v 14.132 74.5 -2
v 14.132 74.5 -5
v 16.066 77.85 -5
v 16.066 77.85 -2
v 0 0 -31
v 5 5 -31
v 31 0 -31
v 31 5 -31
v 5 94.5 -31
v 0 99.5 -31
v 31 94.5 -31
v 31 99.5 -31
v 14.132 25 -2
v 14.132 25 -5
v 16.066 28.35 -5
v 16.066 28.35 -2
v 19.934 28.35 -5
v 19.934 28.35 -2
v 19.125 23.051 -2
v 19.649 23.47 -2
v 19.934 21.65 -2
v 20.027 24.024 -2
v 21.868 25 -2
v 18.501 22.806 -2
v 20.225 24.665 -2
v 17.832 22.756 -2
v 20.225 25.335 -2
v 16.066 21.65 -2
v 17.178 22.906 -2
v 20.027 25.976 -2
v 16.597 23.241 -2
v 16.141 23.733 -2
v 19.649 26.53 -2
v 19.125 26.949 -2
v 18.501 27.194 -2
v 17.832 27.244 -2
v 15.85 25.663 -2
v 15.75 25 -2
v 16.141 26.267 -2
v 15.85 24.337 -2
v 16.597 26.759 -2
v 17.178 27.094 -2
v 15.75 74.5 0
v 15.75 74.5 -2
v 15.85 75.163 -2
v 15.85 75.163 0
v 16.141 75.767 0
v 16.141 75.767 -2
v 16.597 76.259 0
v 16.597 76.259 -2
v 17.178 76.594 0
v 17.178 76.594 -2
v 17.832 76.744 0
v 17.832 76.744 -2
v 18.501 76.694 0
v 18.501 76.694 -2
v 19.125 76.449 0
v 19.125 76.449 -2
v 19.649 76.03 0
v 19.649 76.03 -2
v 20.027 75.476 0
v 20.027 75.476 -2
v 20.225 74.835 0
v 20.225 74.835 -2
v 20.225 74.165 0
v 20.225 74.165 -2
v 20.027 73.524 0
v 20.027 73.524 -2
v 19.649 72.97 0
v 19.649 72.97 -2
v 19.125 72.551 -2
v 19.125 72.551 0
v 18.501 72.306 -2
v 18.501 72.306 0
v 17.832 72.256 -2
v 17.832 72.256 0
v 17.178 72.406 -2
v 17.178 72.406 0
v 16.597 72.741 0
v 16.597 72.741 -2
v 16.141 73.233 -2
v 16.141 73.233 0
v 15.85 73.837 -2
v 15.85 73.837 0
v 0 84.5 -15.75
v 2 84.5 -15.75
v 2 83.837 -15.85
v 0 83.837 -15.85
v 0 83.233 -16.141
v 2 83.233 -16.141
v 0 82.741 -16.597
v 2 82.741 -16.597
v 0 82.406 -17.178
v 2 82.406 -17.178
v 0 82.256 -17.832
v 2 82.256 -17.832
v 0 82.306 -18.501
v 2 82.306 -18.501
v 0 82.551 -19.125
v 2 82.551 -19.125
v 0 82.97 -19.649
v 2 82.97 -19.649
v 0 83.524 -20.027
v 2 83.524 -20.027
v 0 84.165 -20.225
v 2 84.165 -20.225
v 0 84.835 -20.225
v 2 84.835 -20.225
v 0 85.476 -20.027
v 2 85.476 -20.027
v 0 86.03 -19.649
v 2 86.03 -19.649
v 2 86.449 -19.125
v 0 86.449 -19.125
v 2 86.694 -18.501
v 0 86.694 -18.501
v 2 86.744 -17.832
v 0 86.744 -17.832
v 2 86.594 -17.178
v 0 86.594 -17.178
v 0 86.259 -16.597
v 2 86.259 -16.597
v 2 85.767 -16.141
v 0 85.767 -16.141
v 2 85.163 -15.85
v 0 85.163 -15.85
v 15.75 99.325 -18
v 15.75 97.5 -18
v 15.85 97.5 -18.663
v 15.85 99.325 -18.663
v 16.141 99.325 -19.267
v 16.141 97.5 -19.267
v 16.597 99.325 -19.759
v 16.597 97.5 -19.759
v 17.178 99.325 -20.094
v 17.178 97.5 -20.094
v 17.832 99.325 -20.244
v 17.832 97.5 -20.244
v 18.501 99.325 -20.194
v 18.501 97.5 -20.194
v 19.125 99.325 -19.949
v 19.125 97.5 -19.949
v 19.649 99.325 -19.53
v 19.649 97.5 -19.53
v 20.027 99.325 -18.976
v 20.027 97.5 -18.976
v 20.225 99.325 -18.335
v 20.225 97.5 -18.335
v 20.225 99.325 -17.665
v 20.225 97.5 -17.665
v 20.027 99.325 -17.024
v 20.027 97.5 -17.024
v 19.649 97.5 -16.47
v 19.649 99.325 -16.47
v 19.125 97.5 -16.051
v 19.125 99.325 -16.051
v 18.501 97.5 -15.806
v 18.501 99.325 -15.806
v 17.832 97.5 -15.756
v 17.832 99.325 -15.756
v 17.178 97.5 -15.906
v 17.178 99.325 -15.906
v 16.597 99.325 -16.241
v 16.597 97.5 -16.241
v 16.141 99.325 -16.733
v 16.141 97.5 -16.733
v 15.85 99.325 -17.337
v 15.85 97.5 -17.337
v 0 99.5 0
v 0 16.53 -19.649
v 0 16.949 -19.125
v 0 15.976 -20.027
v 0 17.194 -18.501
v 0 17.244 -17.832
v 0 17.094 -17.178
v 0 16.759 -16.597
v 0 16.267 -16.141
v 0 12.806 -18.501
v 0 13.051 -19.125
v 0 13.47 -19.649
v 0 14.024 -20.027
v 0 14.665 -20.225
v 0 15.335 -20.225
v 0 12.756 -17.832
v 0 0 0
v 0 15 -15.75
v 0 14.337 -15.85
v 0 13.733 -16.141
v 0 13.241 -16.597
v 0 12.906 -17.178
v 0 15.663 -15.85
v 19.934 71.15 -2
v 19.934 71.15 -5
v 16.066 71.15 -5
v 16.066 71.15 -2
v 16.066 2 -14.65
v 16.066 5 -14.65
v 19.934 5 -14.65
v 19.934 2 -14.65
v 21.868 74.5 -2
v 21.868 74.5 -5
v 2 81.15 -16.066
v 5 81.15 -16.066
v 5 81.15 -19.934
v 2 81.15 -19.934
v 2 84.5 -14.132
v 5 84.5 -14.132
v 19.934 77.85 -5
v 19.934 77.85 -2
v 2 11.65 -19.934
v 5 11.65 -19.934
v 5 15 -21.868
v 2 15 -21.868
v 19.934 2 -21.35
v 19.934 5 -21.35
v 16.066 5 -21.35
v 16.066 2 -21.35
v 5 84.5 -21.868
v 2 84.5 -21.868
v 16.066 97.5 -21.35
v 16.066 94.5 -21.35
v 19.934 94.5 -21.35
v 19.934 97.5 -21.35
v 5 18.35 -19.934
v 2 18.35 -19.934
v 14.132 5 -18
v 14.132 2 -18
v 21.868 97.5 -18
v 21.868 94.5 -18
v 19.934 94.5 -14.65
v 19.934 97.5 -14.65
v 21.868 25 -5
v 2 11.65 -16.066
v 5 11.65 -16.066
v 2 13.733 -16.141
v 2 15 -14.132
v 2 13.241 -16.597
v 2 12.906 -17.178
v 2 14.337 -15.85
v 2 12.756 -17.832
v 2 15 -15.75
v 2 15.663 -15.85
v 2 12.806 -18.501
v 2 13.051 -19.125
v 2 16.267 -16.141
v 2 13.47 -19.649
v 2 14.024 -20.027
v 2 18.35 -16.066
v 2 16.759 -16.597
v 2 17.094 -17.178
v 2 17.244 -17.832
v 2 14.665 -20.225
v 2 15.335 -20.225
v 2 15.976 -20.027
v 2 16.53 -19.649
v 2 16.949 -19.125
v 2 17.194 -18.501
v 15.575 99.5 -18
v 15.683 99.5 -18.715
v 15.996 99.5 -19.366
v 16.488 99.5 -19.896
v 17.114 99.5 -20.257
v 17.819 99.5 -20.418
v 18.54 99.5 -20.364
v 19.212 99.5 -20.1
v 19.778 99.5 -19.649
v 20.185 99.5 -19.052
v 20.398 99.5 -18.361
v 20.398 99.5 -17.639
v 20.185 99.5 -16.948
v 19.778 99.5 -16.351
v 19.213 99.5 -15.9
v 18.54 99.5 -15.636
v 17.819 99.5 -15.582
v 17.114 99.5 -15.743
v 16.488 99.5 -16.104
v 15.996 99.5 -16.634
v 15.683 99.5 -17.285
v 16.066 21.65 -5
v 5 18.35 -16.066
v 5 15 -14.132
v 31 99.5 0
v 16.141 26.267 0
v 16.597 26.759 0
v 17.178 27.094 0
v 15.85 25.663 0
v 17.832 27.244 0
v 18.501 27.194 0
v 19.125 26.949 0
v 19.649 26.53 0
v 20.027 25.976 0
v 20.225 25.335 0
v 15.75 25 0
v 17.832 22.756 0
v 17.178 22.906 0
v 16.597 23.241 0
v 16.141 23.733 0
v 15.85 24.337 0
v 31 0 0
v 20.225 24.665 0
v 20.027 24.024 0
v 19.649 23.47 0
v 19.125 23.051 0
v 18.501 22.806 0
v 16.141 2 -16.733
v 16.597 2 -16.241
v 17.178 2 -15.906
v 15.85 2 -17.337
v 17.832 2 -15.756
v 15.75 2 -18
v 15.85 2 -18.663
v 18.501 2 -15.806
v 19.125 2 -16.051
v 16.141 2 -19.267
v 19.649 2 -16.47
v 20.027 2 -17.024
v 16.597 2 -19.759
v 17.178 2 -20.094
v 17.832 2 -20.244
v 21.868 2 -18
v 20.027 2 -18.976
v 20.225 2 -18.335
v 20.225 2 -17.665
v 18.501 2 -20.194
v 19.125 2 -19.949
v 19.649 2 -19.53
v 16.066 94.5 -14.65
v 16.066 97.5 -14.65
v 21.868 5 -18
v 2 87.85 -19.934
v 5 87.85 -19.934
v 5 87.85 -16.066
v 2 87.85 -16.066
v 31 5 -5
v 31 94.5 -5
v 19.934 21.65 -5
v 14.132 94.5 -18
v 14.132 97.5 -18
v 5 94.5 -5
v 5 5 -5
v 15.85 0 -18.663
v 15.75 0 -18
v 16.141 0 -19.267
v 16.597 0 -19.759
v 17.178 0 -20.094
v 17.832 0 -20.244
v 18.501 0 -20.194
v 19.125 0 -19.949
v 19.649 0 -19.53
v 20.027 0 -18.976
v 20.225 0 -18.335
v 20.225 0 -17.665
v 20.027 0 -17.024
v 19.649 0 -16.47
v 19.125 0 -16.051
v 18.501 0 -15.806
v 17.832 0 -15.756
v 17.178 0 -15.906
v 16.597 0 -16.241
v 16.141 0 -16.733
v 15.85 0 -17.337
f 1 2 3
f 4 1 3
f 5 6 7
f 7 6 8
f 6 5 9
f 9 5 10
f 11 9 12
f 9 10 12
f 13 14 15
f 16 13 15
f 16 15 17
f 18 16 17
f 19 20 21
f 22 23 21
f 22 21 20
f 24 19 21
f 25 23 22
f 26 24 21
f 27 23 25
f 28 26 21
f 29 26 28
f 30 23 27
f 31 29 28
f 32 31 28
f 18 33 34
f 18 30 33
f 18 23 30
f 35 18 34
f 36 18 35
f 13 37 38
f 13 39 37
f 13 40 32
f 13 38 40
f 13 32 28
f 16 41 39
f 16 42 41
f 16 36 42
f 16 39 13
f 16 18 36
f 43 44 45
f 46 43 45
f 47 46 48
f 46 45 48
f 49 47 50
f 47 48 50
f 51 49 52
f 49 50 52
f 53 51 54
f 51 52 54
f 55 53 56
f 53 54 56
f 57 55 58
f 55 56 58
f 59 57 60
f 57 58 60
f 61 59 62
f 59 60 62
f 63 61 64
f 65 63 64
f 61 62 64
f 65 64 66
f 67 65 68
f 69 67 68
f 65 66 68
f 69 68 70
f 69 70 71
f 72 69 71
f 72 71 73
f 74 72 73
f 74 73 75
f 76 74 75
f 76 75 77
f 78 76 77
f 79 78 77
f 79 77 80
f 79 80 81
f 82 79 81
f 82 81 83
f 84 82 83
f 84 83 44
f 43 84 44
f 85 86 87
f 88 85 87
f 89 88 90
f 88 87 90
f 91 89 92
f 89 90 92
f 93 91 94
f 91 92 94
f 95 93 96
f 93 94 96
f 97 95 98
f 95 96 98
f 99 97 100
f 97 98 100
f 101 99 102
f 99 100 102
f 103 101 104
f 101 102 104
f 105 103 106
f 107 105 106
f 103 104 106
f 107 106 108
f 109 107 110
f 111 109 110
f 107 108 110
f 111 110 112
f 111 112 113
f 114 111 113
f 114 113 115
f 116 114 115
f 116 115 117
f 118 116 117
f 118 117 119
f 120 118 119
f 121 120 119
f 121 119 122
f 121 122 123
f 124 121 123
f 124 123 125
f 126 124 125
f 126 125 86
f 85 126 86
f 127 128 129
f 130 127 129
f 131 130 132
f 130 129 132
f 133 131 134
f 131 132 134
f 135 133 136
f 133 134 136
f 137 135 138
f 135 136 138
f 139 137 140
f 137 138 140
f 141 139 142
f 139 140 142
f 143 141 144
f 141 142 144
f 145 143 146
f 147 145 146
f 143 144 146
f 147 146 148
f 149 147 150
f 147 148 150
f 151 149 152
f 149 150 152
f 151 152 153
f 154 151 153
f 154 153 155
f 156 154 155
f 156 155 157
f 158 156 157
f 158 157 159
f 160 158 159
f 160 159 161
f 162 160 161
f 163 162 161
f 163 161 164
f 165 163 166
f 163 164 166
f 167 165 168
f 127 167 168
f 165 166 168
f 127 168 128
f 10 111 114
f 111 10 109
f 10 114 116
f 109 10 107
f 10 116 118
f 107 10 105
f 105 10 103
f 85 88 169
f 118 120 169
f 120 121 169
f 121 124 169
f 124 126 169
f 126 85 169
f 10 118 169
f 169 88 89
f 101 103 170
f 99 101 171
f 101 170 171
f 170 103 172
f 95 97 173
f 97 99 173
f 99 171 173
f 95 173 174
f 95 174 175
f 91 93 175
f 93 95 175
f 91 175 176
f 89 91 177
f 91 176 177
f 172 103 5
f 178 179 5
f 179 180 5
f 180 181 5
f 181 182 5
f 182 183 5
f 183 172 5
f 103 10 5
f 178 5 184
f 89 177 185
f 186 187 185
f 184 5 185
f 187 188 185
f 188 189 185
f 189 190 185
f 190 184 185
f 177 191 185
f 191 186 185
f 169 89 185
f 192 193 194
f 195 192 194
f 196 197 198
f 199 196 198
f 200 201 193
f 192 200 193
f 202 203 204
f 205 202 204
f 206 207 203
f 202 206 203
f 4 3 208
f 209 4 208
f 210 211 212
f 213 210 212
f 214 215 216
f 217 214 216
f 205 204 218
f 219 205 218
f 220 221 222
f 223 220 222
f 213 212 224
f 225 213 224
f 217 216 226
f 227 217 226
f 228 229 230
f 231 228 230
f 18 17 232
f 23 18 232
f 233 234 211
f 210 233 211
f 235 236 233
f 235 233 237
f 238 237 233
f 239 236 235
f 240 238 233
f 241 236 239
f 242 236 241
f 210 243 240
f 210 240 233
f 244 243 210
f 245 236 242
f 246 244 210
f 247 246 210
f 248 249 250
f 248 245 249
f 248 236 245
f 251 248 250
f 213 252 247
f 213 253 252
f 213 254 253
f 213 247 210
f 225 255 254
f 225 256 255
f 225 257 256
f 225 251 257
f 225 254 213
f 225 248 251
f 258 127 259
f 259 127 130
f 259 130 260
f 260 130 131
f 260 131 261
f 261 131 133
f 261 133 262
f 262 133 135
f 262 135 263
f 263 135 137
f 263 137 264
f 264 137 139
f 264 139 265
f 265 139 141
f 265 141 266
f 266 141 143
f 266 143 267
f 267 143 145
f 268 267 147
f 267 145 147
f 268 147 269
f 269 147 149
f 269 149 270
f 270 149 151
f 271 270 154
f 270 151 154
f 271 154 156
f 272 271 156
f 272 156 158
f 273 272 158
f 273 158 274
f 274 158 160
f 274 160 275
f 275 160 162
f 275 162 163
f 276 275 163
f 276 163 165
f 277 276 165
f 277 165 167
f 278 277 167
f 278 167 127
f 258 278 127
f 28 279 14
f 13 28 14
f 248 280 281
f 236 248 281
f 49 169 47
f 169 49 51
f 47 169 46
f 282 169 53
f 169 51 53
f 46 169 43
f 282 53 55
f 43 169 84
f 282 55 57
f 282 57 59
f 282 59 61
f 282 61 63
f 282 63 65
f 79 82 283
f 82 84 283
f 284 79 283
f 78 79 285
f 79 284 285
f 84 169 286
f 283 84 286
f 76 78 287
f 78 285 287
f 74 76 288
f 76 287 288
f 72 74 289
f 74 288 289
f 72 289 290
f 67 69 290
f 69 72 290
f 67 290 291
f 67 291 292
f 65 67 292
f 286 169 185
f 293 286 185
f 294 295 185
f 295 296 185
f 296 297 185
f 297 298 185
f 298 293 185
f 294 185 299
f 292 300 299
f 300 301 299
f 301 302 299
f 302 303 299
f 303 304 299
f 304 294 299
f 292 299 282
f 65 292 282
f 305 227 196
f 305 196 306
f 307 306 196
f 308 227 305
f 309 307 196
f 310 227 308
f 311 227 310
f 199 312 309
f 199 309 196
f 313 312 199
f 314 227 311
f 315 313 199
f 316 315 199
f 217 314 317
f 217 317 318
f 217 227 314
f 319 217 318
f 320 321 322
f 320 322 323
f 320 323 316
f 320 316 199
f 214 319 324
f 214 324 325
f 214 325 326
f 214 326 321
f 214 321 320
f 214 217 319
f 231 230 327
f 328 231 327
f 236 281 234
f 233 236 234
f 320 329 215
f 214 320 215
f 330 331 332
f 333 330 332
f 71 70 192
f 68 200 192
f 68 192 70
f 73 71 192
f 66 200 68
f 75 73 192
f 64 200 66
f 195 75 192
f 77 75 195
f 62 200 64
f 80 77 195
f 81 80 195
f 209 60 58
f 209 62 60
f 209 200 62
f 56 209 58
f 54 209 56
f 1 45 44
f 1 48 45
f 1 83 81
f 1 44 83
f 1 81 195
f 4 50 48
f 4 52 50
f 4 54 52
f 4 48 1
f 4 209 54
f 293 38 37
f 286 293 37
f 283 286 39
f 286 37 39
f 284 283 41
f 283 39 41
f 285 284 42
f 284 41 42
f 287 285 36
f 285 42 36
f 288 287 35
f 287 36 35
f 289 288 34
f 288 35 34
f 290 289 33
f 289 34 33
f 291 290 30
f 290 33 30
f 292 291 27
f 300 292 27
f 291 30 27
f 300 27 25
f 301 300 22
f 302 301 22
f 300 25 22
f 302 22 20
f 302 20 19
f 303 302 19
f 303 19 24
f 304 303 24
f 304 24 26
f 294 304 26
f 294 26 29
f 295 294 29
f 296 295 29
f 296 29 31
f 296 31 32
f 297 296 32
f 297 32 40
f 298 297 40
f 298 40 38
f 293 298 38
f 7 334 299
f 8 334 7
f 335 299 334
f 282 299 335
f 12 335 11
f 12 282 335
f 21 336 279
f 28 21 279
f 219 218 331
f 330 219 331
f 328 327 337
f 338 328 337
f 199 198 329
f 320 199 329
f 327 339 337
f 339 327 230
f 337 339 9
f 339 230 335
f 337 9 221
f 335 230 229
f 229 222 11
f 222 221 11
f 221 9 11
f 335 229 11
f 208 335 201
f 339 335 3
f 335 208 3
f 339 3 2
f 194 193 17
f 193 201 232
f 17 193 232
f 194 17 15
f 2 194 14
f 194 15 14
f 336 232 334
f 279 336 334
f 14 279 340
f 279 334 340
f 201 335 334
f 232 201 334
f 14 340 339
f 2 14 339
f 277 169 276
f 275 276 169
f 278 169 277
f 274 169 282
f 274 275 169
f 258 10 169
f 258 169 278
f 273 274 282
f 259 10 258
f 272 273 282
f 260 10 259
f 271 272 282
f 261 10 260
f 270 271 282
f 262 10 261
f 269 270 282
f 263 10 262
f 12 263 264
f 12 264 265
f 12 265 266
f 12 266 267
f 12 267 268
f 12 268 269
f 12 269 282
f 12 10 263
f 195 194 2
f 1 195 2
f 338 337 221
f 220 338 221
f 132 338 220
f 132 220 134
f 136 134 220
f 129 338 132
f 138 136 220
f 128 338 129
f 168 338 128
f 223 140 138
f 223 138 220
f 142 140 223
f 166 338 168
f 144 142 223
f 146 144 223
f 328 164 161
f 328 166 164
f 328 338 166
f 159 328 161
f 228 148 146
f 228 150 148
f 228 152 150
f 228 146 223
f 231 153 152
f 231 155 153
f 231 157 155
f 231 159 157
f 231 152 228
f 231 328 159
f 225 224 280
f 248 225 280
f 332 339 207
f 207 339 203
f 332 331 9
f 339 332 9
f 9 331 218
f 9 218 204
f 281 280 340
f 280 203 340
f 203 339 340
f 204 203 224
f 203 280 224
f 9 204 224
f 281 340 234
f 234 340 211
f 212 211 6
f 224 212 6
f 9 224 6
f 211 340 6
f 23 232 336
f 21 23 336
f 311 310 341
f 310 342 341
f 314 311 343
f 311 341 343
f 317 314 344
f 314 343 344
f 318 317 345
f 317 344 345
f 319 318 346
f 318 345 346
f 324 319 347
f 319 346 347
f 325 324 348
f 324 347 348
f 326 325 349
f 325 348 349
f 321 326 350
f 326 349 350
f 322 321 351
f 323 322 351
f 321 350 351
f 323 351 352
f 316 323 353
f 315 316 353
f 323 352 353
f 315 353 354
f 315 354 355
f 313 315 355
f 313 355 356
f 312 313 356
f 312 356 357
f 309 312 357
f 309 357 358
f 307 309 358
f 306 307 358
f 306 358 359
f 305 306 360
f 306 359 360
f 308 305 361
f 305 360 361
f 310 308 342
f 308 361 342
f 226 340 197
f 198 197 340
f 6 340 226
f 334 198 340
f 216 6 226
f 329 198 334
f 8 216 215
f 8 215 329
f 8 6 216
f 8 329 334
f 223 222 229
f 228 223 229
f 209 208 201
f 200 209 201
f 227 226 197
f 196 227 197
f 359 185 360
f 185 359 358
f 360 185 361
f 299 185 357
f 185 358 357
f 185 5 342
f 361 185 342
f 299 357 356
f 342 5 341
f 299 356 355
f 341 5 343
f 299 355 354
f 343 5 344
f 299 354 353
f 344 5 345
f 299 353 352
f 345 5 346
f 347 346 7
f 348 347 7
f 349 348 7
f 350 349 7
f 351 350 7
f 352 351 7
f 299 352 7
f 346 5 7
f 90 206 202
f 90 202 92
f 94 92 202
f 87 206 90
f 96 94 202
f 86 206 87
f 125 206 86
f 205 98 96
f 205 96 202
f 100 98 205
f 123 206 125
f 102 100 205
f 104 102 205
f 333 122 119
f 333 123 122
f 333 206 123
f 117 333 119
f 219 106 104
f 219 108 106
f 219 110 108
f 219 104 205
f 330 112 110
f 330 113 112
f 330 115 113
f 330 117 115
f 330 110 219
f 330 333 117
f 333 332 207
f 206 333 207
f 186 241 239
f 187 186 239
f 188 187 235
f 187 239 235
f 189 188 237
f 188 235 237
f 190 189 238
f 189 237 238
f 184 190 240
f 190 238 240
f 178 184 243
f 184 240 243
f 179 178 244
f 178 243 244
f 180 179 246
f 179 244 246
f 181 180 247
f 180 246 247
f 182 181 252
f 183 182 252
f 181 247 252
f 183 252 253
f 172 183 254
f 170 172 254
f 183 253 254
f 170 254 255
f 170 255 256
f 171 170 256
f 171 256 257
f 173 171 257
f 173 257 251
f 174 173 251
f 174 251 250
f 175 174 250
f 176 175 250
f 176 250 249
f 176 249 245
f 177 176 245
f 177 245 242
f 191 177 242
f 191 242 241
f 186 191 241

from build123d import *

# Parameters (mm, degrees)
RESSALTO_EXTRUS_O1_DEPTH          = 99.5
FURO_COM_FOLGA_DE_M43_D           = 4.5
FURO_COM_FOLGA_DE_M43_ON_FACE_2_D = 4.5
NERVURA4_START                    = -5
NERVURA4_OUTLINE_W                = 26
NERVURA4_OUTLINE_H                = 26
NERVURA4_DEPTH                    = 5
CORTE_EXTRUS_O3_DEPTH             = 3
CORTE_EXTRUS_O4_DEPTH             = 3
FURO_COM_FOLGA_DE_M42_D           = 4.5
FURO_COM_FOLGA_DE_M42_CSINK_D     = 4.85
FURO_COM_FOLGA_DE_M42_CSINK_ANGLE = 90
CORTE_EXTRUS_O5_DEPTH             = 3
CORTE_EXTRUS_O6_DEPTH             = 3


# Read off the part's stored shape, not the designer's step: Nervura4
with BuildPart() as part:
    # Esboço1 → Ressalto-extrusão1 (new body)
    with BuildSketch(Plane(origin=(0, 0, 0), x_dir=(1, 0, 0), z_dir=(0, 1, 0))):
        Polygon((0, 0), (31, 0), (31, 5), (5, 5), (5, 31), (0, 31), align=None)
    extrude(amount=RESSALTO_EXTRUS_O1_DEPTH)

    # Furo com folga de M43 (through all)
    with Locations(Plane(origin=(0, 84.5, -18), x_dir=(0, 0, -1), z_dir=(-1, 0, 0))):
        with Locations((0, 0), (0, 69.5)):
            Hole(FURO_COM_FOLGA_DE_M43_D / 2)

    # Furo com folga de M43 on face 2 (through all)
    with Locations(Plane(origin=(18, 74.5, 0), x_dir=(1, 0, 0), z_dir=(0, 0, 1))):
        with Locations((0, 0), (0, -49.5)):
            Hole(FURO_COM_FOLGA_DE_M43_ON_FACE_2_D / 2)

    # Nervura4 outline → Nervura4 (add)
    with BuildSketch(Plane(origin=(0, 99.5, 0), x_dir=(1, 0, 0), z_dir=(0, 1, 0)).offset(NERVURA4_START)):
        with Locations((18, 18)):
            Rectangle(NERVURA4_OUTLINE_W, NERVURA4_OUTLINE_H)
    nervura4 = extrude(amount=NERVURA4_DEPTH)

    # Esboço17 → Corte-extrusão3 (cut)
    with BuildSketch(Plane(origin=(0, 0, -5), x_dir=(-1, 0, 0), z_dir=(0, 0, -1))):
        Polygon((-16.065876598, 77.85), (-19.934123402, 77.85), (-21.868246804, 74.5), (-19.934123402, 71.15), (-16.065876598, 71.15), (-14.131753196, 74.5), align=None)
        Polygon((-14.131753196, 25), (-16.065876598, 28.35), (-19.934123402, 28.35), (-21.868246804, 25), (-19.934123402, 21.65), (-16.065876598, 21.65), align=None)
    extrude(amount=-CORTE_EXTRUS_O3_DEPTH, mode=Mode.SUBTRACT)

    # Esboço18 → Corte-extrusão4 (cut)
    with BuildSketch(Plane(origin=(5, 0, 0), x_dir=(0, 0, -1), z_dir=(1, 0, 0))):
        Polygon((19.934123402, 87.85), (16.065876598, 87.85), (14.131753196, 84.5), (16.065876598, 81.15), (19.934123402, 81.15), (21.868246804, 84.5), align=None)
        Polygon((21.868246804, 15), (19.934123402, 18.35), (16.065876598, 18.35), (14.131753196, 15), (16.065876598, 11.65), (19.934123402, 11.65), align=None)
    extrude(amount=-CORTE_EXTRUS_O4_DEPTH, mode=Mode.SUBTRACT)

    # Espelhar1: Nervura4 across plane
    add(nervura4.mirror(Plane(origin=(0, 49.75, 0), x_dir=(0, 0, 1), z_dir=(0, -1, 0))))

    # Furo com folga de M42 (through all)
    with Locations(Plane(origin=(0, 99.5, 0), x_dir=(1, 0, 0), z_dir=(0, 1, 0))):
        with Locations((18, 18)):
            CounterSinkHole(FURO_COM_FOLGA_DE_M42_D / 2, FURO_COM_FOLGA_DE_M42_CSINK_D / 2, counter_sink_angle=FURO_COM_FOLGA_DE_M42_CSINK_ANGLE)

    # Esboço27 → Corte-extrusão5 (cut)
    with BuildSketch(Plane.XZ.offset(-94.5)):
        Polygon((21.868246804, -18), (19.934123402, -14.65), (16.065876598, -14.65), (14.131753196, -18), (16.065876598, -21.35), (19.934123402, -21.35), align=None)
    extrude(amount=-CORTE_EXTRUS_O5_DEPTH, mode=Mode.SUBTRACT)

    # Esboço28 → Corte-extrusão6 (cut)
    with BuildSketch(Plane(origin=(0, 5, 0), x_dir=(1, 0, 0), z_dir=(0, 1, 0))):
        Polygon((19.934123402, 21.35), (16.065876598, 21.35), (14.131753196, 18), (16.065876598, 14.65), (19.934123402, 14.65), (21.868246804, 18), align=None)
    extrude(amount=-CORTE_EXTRUS_O6_DEPTH, mode=Mode.SUBTRACT)


solid = part.part
